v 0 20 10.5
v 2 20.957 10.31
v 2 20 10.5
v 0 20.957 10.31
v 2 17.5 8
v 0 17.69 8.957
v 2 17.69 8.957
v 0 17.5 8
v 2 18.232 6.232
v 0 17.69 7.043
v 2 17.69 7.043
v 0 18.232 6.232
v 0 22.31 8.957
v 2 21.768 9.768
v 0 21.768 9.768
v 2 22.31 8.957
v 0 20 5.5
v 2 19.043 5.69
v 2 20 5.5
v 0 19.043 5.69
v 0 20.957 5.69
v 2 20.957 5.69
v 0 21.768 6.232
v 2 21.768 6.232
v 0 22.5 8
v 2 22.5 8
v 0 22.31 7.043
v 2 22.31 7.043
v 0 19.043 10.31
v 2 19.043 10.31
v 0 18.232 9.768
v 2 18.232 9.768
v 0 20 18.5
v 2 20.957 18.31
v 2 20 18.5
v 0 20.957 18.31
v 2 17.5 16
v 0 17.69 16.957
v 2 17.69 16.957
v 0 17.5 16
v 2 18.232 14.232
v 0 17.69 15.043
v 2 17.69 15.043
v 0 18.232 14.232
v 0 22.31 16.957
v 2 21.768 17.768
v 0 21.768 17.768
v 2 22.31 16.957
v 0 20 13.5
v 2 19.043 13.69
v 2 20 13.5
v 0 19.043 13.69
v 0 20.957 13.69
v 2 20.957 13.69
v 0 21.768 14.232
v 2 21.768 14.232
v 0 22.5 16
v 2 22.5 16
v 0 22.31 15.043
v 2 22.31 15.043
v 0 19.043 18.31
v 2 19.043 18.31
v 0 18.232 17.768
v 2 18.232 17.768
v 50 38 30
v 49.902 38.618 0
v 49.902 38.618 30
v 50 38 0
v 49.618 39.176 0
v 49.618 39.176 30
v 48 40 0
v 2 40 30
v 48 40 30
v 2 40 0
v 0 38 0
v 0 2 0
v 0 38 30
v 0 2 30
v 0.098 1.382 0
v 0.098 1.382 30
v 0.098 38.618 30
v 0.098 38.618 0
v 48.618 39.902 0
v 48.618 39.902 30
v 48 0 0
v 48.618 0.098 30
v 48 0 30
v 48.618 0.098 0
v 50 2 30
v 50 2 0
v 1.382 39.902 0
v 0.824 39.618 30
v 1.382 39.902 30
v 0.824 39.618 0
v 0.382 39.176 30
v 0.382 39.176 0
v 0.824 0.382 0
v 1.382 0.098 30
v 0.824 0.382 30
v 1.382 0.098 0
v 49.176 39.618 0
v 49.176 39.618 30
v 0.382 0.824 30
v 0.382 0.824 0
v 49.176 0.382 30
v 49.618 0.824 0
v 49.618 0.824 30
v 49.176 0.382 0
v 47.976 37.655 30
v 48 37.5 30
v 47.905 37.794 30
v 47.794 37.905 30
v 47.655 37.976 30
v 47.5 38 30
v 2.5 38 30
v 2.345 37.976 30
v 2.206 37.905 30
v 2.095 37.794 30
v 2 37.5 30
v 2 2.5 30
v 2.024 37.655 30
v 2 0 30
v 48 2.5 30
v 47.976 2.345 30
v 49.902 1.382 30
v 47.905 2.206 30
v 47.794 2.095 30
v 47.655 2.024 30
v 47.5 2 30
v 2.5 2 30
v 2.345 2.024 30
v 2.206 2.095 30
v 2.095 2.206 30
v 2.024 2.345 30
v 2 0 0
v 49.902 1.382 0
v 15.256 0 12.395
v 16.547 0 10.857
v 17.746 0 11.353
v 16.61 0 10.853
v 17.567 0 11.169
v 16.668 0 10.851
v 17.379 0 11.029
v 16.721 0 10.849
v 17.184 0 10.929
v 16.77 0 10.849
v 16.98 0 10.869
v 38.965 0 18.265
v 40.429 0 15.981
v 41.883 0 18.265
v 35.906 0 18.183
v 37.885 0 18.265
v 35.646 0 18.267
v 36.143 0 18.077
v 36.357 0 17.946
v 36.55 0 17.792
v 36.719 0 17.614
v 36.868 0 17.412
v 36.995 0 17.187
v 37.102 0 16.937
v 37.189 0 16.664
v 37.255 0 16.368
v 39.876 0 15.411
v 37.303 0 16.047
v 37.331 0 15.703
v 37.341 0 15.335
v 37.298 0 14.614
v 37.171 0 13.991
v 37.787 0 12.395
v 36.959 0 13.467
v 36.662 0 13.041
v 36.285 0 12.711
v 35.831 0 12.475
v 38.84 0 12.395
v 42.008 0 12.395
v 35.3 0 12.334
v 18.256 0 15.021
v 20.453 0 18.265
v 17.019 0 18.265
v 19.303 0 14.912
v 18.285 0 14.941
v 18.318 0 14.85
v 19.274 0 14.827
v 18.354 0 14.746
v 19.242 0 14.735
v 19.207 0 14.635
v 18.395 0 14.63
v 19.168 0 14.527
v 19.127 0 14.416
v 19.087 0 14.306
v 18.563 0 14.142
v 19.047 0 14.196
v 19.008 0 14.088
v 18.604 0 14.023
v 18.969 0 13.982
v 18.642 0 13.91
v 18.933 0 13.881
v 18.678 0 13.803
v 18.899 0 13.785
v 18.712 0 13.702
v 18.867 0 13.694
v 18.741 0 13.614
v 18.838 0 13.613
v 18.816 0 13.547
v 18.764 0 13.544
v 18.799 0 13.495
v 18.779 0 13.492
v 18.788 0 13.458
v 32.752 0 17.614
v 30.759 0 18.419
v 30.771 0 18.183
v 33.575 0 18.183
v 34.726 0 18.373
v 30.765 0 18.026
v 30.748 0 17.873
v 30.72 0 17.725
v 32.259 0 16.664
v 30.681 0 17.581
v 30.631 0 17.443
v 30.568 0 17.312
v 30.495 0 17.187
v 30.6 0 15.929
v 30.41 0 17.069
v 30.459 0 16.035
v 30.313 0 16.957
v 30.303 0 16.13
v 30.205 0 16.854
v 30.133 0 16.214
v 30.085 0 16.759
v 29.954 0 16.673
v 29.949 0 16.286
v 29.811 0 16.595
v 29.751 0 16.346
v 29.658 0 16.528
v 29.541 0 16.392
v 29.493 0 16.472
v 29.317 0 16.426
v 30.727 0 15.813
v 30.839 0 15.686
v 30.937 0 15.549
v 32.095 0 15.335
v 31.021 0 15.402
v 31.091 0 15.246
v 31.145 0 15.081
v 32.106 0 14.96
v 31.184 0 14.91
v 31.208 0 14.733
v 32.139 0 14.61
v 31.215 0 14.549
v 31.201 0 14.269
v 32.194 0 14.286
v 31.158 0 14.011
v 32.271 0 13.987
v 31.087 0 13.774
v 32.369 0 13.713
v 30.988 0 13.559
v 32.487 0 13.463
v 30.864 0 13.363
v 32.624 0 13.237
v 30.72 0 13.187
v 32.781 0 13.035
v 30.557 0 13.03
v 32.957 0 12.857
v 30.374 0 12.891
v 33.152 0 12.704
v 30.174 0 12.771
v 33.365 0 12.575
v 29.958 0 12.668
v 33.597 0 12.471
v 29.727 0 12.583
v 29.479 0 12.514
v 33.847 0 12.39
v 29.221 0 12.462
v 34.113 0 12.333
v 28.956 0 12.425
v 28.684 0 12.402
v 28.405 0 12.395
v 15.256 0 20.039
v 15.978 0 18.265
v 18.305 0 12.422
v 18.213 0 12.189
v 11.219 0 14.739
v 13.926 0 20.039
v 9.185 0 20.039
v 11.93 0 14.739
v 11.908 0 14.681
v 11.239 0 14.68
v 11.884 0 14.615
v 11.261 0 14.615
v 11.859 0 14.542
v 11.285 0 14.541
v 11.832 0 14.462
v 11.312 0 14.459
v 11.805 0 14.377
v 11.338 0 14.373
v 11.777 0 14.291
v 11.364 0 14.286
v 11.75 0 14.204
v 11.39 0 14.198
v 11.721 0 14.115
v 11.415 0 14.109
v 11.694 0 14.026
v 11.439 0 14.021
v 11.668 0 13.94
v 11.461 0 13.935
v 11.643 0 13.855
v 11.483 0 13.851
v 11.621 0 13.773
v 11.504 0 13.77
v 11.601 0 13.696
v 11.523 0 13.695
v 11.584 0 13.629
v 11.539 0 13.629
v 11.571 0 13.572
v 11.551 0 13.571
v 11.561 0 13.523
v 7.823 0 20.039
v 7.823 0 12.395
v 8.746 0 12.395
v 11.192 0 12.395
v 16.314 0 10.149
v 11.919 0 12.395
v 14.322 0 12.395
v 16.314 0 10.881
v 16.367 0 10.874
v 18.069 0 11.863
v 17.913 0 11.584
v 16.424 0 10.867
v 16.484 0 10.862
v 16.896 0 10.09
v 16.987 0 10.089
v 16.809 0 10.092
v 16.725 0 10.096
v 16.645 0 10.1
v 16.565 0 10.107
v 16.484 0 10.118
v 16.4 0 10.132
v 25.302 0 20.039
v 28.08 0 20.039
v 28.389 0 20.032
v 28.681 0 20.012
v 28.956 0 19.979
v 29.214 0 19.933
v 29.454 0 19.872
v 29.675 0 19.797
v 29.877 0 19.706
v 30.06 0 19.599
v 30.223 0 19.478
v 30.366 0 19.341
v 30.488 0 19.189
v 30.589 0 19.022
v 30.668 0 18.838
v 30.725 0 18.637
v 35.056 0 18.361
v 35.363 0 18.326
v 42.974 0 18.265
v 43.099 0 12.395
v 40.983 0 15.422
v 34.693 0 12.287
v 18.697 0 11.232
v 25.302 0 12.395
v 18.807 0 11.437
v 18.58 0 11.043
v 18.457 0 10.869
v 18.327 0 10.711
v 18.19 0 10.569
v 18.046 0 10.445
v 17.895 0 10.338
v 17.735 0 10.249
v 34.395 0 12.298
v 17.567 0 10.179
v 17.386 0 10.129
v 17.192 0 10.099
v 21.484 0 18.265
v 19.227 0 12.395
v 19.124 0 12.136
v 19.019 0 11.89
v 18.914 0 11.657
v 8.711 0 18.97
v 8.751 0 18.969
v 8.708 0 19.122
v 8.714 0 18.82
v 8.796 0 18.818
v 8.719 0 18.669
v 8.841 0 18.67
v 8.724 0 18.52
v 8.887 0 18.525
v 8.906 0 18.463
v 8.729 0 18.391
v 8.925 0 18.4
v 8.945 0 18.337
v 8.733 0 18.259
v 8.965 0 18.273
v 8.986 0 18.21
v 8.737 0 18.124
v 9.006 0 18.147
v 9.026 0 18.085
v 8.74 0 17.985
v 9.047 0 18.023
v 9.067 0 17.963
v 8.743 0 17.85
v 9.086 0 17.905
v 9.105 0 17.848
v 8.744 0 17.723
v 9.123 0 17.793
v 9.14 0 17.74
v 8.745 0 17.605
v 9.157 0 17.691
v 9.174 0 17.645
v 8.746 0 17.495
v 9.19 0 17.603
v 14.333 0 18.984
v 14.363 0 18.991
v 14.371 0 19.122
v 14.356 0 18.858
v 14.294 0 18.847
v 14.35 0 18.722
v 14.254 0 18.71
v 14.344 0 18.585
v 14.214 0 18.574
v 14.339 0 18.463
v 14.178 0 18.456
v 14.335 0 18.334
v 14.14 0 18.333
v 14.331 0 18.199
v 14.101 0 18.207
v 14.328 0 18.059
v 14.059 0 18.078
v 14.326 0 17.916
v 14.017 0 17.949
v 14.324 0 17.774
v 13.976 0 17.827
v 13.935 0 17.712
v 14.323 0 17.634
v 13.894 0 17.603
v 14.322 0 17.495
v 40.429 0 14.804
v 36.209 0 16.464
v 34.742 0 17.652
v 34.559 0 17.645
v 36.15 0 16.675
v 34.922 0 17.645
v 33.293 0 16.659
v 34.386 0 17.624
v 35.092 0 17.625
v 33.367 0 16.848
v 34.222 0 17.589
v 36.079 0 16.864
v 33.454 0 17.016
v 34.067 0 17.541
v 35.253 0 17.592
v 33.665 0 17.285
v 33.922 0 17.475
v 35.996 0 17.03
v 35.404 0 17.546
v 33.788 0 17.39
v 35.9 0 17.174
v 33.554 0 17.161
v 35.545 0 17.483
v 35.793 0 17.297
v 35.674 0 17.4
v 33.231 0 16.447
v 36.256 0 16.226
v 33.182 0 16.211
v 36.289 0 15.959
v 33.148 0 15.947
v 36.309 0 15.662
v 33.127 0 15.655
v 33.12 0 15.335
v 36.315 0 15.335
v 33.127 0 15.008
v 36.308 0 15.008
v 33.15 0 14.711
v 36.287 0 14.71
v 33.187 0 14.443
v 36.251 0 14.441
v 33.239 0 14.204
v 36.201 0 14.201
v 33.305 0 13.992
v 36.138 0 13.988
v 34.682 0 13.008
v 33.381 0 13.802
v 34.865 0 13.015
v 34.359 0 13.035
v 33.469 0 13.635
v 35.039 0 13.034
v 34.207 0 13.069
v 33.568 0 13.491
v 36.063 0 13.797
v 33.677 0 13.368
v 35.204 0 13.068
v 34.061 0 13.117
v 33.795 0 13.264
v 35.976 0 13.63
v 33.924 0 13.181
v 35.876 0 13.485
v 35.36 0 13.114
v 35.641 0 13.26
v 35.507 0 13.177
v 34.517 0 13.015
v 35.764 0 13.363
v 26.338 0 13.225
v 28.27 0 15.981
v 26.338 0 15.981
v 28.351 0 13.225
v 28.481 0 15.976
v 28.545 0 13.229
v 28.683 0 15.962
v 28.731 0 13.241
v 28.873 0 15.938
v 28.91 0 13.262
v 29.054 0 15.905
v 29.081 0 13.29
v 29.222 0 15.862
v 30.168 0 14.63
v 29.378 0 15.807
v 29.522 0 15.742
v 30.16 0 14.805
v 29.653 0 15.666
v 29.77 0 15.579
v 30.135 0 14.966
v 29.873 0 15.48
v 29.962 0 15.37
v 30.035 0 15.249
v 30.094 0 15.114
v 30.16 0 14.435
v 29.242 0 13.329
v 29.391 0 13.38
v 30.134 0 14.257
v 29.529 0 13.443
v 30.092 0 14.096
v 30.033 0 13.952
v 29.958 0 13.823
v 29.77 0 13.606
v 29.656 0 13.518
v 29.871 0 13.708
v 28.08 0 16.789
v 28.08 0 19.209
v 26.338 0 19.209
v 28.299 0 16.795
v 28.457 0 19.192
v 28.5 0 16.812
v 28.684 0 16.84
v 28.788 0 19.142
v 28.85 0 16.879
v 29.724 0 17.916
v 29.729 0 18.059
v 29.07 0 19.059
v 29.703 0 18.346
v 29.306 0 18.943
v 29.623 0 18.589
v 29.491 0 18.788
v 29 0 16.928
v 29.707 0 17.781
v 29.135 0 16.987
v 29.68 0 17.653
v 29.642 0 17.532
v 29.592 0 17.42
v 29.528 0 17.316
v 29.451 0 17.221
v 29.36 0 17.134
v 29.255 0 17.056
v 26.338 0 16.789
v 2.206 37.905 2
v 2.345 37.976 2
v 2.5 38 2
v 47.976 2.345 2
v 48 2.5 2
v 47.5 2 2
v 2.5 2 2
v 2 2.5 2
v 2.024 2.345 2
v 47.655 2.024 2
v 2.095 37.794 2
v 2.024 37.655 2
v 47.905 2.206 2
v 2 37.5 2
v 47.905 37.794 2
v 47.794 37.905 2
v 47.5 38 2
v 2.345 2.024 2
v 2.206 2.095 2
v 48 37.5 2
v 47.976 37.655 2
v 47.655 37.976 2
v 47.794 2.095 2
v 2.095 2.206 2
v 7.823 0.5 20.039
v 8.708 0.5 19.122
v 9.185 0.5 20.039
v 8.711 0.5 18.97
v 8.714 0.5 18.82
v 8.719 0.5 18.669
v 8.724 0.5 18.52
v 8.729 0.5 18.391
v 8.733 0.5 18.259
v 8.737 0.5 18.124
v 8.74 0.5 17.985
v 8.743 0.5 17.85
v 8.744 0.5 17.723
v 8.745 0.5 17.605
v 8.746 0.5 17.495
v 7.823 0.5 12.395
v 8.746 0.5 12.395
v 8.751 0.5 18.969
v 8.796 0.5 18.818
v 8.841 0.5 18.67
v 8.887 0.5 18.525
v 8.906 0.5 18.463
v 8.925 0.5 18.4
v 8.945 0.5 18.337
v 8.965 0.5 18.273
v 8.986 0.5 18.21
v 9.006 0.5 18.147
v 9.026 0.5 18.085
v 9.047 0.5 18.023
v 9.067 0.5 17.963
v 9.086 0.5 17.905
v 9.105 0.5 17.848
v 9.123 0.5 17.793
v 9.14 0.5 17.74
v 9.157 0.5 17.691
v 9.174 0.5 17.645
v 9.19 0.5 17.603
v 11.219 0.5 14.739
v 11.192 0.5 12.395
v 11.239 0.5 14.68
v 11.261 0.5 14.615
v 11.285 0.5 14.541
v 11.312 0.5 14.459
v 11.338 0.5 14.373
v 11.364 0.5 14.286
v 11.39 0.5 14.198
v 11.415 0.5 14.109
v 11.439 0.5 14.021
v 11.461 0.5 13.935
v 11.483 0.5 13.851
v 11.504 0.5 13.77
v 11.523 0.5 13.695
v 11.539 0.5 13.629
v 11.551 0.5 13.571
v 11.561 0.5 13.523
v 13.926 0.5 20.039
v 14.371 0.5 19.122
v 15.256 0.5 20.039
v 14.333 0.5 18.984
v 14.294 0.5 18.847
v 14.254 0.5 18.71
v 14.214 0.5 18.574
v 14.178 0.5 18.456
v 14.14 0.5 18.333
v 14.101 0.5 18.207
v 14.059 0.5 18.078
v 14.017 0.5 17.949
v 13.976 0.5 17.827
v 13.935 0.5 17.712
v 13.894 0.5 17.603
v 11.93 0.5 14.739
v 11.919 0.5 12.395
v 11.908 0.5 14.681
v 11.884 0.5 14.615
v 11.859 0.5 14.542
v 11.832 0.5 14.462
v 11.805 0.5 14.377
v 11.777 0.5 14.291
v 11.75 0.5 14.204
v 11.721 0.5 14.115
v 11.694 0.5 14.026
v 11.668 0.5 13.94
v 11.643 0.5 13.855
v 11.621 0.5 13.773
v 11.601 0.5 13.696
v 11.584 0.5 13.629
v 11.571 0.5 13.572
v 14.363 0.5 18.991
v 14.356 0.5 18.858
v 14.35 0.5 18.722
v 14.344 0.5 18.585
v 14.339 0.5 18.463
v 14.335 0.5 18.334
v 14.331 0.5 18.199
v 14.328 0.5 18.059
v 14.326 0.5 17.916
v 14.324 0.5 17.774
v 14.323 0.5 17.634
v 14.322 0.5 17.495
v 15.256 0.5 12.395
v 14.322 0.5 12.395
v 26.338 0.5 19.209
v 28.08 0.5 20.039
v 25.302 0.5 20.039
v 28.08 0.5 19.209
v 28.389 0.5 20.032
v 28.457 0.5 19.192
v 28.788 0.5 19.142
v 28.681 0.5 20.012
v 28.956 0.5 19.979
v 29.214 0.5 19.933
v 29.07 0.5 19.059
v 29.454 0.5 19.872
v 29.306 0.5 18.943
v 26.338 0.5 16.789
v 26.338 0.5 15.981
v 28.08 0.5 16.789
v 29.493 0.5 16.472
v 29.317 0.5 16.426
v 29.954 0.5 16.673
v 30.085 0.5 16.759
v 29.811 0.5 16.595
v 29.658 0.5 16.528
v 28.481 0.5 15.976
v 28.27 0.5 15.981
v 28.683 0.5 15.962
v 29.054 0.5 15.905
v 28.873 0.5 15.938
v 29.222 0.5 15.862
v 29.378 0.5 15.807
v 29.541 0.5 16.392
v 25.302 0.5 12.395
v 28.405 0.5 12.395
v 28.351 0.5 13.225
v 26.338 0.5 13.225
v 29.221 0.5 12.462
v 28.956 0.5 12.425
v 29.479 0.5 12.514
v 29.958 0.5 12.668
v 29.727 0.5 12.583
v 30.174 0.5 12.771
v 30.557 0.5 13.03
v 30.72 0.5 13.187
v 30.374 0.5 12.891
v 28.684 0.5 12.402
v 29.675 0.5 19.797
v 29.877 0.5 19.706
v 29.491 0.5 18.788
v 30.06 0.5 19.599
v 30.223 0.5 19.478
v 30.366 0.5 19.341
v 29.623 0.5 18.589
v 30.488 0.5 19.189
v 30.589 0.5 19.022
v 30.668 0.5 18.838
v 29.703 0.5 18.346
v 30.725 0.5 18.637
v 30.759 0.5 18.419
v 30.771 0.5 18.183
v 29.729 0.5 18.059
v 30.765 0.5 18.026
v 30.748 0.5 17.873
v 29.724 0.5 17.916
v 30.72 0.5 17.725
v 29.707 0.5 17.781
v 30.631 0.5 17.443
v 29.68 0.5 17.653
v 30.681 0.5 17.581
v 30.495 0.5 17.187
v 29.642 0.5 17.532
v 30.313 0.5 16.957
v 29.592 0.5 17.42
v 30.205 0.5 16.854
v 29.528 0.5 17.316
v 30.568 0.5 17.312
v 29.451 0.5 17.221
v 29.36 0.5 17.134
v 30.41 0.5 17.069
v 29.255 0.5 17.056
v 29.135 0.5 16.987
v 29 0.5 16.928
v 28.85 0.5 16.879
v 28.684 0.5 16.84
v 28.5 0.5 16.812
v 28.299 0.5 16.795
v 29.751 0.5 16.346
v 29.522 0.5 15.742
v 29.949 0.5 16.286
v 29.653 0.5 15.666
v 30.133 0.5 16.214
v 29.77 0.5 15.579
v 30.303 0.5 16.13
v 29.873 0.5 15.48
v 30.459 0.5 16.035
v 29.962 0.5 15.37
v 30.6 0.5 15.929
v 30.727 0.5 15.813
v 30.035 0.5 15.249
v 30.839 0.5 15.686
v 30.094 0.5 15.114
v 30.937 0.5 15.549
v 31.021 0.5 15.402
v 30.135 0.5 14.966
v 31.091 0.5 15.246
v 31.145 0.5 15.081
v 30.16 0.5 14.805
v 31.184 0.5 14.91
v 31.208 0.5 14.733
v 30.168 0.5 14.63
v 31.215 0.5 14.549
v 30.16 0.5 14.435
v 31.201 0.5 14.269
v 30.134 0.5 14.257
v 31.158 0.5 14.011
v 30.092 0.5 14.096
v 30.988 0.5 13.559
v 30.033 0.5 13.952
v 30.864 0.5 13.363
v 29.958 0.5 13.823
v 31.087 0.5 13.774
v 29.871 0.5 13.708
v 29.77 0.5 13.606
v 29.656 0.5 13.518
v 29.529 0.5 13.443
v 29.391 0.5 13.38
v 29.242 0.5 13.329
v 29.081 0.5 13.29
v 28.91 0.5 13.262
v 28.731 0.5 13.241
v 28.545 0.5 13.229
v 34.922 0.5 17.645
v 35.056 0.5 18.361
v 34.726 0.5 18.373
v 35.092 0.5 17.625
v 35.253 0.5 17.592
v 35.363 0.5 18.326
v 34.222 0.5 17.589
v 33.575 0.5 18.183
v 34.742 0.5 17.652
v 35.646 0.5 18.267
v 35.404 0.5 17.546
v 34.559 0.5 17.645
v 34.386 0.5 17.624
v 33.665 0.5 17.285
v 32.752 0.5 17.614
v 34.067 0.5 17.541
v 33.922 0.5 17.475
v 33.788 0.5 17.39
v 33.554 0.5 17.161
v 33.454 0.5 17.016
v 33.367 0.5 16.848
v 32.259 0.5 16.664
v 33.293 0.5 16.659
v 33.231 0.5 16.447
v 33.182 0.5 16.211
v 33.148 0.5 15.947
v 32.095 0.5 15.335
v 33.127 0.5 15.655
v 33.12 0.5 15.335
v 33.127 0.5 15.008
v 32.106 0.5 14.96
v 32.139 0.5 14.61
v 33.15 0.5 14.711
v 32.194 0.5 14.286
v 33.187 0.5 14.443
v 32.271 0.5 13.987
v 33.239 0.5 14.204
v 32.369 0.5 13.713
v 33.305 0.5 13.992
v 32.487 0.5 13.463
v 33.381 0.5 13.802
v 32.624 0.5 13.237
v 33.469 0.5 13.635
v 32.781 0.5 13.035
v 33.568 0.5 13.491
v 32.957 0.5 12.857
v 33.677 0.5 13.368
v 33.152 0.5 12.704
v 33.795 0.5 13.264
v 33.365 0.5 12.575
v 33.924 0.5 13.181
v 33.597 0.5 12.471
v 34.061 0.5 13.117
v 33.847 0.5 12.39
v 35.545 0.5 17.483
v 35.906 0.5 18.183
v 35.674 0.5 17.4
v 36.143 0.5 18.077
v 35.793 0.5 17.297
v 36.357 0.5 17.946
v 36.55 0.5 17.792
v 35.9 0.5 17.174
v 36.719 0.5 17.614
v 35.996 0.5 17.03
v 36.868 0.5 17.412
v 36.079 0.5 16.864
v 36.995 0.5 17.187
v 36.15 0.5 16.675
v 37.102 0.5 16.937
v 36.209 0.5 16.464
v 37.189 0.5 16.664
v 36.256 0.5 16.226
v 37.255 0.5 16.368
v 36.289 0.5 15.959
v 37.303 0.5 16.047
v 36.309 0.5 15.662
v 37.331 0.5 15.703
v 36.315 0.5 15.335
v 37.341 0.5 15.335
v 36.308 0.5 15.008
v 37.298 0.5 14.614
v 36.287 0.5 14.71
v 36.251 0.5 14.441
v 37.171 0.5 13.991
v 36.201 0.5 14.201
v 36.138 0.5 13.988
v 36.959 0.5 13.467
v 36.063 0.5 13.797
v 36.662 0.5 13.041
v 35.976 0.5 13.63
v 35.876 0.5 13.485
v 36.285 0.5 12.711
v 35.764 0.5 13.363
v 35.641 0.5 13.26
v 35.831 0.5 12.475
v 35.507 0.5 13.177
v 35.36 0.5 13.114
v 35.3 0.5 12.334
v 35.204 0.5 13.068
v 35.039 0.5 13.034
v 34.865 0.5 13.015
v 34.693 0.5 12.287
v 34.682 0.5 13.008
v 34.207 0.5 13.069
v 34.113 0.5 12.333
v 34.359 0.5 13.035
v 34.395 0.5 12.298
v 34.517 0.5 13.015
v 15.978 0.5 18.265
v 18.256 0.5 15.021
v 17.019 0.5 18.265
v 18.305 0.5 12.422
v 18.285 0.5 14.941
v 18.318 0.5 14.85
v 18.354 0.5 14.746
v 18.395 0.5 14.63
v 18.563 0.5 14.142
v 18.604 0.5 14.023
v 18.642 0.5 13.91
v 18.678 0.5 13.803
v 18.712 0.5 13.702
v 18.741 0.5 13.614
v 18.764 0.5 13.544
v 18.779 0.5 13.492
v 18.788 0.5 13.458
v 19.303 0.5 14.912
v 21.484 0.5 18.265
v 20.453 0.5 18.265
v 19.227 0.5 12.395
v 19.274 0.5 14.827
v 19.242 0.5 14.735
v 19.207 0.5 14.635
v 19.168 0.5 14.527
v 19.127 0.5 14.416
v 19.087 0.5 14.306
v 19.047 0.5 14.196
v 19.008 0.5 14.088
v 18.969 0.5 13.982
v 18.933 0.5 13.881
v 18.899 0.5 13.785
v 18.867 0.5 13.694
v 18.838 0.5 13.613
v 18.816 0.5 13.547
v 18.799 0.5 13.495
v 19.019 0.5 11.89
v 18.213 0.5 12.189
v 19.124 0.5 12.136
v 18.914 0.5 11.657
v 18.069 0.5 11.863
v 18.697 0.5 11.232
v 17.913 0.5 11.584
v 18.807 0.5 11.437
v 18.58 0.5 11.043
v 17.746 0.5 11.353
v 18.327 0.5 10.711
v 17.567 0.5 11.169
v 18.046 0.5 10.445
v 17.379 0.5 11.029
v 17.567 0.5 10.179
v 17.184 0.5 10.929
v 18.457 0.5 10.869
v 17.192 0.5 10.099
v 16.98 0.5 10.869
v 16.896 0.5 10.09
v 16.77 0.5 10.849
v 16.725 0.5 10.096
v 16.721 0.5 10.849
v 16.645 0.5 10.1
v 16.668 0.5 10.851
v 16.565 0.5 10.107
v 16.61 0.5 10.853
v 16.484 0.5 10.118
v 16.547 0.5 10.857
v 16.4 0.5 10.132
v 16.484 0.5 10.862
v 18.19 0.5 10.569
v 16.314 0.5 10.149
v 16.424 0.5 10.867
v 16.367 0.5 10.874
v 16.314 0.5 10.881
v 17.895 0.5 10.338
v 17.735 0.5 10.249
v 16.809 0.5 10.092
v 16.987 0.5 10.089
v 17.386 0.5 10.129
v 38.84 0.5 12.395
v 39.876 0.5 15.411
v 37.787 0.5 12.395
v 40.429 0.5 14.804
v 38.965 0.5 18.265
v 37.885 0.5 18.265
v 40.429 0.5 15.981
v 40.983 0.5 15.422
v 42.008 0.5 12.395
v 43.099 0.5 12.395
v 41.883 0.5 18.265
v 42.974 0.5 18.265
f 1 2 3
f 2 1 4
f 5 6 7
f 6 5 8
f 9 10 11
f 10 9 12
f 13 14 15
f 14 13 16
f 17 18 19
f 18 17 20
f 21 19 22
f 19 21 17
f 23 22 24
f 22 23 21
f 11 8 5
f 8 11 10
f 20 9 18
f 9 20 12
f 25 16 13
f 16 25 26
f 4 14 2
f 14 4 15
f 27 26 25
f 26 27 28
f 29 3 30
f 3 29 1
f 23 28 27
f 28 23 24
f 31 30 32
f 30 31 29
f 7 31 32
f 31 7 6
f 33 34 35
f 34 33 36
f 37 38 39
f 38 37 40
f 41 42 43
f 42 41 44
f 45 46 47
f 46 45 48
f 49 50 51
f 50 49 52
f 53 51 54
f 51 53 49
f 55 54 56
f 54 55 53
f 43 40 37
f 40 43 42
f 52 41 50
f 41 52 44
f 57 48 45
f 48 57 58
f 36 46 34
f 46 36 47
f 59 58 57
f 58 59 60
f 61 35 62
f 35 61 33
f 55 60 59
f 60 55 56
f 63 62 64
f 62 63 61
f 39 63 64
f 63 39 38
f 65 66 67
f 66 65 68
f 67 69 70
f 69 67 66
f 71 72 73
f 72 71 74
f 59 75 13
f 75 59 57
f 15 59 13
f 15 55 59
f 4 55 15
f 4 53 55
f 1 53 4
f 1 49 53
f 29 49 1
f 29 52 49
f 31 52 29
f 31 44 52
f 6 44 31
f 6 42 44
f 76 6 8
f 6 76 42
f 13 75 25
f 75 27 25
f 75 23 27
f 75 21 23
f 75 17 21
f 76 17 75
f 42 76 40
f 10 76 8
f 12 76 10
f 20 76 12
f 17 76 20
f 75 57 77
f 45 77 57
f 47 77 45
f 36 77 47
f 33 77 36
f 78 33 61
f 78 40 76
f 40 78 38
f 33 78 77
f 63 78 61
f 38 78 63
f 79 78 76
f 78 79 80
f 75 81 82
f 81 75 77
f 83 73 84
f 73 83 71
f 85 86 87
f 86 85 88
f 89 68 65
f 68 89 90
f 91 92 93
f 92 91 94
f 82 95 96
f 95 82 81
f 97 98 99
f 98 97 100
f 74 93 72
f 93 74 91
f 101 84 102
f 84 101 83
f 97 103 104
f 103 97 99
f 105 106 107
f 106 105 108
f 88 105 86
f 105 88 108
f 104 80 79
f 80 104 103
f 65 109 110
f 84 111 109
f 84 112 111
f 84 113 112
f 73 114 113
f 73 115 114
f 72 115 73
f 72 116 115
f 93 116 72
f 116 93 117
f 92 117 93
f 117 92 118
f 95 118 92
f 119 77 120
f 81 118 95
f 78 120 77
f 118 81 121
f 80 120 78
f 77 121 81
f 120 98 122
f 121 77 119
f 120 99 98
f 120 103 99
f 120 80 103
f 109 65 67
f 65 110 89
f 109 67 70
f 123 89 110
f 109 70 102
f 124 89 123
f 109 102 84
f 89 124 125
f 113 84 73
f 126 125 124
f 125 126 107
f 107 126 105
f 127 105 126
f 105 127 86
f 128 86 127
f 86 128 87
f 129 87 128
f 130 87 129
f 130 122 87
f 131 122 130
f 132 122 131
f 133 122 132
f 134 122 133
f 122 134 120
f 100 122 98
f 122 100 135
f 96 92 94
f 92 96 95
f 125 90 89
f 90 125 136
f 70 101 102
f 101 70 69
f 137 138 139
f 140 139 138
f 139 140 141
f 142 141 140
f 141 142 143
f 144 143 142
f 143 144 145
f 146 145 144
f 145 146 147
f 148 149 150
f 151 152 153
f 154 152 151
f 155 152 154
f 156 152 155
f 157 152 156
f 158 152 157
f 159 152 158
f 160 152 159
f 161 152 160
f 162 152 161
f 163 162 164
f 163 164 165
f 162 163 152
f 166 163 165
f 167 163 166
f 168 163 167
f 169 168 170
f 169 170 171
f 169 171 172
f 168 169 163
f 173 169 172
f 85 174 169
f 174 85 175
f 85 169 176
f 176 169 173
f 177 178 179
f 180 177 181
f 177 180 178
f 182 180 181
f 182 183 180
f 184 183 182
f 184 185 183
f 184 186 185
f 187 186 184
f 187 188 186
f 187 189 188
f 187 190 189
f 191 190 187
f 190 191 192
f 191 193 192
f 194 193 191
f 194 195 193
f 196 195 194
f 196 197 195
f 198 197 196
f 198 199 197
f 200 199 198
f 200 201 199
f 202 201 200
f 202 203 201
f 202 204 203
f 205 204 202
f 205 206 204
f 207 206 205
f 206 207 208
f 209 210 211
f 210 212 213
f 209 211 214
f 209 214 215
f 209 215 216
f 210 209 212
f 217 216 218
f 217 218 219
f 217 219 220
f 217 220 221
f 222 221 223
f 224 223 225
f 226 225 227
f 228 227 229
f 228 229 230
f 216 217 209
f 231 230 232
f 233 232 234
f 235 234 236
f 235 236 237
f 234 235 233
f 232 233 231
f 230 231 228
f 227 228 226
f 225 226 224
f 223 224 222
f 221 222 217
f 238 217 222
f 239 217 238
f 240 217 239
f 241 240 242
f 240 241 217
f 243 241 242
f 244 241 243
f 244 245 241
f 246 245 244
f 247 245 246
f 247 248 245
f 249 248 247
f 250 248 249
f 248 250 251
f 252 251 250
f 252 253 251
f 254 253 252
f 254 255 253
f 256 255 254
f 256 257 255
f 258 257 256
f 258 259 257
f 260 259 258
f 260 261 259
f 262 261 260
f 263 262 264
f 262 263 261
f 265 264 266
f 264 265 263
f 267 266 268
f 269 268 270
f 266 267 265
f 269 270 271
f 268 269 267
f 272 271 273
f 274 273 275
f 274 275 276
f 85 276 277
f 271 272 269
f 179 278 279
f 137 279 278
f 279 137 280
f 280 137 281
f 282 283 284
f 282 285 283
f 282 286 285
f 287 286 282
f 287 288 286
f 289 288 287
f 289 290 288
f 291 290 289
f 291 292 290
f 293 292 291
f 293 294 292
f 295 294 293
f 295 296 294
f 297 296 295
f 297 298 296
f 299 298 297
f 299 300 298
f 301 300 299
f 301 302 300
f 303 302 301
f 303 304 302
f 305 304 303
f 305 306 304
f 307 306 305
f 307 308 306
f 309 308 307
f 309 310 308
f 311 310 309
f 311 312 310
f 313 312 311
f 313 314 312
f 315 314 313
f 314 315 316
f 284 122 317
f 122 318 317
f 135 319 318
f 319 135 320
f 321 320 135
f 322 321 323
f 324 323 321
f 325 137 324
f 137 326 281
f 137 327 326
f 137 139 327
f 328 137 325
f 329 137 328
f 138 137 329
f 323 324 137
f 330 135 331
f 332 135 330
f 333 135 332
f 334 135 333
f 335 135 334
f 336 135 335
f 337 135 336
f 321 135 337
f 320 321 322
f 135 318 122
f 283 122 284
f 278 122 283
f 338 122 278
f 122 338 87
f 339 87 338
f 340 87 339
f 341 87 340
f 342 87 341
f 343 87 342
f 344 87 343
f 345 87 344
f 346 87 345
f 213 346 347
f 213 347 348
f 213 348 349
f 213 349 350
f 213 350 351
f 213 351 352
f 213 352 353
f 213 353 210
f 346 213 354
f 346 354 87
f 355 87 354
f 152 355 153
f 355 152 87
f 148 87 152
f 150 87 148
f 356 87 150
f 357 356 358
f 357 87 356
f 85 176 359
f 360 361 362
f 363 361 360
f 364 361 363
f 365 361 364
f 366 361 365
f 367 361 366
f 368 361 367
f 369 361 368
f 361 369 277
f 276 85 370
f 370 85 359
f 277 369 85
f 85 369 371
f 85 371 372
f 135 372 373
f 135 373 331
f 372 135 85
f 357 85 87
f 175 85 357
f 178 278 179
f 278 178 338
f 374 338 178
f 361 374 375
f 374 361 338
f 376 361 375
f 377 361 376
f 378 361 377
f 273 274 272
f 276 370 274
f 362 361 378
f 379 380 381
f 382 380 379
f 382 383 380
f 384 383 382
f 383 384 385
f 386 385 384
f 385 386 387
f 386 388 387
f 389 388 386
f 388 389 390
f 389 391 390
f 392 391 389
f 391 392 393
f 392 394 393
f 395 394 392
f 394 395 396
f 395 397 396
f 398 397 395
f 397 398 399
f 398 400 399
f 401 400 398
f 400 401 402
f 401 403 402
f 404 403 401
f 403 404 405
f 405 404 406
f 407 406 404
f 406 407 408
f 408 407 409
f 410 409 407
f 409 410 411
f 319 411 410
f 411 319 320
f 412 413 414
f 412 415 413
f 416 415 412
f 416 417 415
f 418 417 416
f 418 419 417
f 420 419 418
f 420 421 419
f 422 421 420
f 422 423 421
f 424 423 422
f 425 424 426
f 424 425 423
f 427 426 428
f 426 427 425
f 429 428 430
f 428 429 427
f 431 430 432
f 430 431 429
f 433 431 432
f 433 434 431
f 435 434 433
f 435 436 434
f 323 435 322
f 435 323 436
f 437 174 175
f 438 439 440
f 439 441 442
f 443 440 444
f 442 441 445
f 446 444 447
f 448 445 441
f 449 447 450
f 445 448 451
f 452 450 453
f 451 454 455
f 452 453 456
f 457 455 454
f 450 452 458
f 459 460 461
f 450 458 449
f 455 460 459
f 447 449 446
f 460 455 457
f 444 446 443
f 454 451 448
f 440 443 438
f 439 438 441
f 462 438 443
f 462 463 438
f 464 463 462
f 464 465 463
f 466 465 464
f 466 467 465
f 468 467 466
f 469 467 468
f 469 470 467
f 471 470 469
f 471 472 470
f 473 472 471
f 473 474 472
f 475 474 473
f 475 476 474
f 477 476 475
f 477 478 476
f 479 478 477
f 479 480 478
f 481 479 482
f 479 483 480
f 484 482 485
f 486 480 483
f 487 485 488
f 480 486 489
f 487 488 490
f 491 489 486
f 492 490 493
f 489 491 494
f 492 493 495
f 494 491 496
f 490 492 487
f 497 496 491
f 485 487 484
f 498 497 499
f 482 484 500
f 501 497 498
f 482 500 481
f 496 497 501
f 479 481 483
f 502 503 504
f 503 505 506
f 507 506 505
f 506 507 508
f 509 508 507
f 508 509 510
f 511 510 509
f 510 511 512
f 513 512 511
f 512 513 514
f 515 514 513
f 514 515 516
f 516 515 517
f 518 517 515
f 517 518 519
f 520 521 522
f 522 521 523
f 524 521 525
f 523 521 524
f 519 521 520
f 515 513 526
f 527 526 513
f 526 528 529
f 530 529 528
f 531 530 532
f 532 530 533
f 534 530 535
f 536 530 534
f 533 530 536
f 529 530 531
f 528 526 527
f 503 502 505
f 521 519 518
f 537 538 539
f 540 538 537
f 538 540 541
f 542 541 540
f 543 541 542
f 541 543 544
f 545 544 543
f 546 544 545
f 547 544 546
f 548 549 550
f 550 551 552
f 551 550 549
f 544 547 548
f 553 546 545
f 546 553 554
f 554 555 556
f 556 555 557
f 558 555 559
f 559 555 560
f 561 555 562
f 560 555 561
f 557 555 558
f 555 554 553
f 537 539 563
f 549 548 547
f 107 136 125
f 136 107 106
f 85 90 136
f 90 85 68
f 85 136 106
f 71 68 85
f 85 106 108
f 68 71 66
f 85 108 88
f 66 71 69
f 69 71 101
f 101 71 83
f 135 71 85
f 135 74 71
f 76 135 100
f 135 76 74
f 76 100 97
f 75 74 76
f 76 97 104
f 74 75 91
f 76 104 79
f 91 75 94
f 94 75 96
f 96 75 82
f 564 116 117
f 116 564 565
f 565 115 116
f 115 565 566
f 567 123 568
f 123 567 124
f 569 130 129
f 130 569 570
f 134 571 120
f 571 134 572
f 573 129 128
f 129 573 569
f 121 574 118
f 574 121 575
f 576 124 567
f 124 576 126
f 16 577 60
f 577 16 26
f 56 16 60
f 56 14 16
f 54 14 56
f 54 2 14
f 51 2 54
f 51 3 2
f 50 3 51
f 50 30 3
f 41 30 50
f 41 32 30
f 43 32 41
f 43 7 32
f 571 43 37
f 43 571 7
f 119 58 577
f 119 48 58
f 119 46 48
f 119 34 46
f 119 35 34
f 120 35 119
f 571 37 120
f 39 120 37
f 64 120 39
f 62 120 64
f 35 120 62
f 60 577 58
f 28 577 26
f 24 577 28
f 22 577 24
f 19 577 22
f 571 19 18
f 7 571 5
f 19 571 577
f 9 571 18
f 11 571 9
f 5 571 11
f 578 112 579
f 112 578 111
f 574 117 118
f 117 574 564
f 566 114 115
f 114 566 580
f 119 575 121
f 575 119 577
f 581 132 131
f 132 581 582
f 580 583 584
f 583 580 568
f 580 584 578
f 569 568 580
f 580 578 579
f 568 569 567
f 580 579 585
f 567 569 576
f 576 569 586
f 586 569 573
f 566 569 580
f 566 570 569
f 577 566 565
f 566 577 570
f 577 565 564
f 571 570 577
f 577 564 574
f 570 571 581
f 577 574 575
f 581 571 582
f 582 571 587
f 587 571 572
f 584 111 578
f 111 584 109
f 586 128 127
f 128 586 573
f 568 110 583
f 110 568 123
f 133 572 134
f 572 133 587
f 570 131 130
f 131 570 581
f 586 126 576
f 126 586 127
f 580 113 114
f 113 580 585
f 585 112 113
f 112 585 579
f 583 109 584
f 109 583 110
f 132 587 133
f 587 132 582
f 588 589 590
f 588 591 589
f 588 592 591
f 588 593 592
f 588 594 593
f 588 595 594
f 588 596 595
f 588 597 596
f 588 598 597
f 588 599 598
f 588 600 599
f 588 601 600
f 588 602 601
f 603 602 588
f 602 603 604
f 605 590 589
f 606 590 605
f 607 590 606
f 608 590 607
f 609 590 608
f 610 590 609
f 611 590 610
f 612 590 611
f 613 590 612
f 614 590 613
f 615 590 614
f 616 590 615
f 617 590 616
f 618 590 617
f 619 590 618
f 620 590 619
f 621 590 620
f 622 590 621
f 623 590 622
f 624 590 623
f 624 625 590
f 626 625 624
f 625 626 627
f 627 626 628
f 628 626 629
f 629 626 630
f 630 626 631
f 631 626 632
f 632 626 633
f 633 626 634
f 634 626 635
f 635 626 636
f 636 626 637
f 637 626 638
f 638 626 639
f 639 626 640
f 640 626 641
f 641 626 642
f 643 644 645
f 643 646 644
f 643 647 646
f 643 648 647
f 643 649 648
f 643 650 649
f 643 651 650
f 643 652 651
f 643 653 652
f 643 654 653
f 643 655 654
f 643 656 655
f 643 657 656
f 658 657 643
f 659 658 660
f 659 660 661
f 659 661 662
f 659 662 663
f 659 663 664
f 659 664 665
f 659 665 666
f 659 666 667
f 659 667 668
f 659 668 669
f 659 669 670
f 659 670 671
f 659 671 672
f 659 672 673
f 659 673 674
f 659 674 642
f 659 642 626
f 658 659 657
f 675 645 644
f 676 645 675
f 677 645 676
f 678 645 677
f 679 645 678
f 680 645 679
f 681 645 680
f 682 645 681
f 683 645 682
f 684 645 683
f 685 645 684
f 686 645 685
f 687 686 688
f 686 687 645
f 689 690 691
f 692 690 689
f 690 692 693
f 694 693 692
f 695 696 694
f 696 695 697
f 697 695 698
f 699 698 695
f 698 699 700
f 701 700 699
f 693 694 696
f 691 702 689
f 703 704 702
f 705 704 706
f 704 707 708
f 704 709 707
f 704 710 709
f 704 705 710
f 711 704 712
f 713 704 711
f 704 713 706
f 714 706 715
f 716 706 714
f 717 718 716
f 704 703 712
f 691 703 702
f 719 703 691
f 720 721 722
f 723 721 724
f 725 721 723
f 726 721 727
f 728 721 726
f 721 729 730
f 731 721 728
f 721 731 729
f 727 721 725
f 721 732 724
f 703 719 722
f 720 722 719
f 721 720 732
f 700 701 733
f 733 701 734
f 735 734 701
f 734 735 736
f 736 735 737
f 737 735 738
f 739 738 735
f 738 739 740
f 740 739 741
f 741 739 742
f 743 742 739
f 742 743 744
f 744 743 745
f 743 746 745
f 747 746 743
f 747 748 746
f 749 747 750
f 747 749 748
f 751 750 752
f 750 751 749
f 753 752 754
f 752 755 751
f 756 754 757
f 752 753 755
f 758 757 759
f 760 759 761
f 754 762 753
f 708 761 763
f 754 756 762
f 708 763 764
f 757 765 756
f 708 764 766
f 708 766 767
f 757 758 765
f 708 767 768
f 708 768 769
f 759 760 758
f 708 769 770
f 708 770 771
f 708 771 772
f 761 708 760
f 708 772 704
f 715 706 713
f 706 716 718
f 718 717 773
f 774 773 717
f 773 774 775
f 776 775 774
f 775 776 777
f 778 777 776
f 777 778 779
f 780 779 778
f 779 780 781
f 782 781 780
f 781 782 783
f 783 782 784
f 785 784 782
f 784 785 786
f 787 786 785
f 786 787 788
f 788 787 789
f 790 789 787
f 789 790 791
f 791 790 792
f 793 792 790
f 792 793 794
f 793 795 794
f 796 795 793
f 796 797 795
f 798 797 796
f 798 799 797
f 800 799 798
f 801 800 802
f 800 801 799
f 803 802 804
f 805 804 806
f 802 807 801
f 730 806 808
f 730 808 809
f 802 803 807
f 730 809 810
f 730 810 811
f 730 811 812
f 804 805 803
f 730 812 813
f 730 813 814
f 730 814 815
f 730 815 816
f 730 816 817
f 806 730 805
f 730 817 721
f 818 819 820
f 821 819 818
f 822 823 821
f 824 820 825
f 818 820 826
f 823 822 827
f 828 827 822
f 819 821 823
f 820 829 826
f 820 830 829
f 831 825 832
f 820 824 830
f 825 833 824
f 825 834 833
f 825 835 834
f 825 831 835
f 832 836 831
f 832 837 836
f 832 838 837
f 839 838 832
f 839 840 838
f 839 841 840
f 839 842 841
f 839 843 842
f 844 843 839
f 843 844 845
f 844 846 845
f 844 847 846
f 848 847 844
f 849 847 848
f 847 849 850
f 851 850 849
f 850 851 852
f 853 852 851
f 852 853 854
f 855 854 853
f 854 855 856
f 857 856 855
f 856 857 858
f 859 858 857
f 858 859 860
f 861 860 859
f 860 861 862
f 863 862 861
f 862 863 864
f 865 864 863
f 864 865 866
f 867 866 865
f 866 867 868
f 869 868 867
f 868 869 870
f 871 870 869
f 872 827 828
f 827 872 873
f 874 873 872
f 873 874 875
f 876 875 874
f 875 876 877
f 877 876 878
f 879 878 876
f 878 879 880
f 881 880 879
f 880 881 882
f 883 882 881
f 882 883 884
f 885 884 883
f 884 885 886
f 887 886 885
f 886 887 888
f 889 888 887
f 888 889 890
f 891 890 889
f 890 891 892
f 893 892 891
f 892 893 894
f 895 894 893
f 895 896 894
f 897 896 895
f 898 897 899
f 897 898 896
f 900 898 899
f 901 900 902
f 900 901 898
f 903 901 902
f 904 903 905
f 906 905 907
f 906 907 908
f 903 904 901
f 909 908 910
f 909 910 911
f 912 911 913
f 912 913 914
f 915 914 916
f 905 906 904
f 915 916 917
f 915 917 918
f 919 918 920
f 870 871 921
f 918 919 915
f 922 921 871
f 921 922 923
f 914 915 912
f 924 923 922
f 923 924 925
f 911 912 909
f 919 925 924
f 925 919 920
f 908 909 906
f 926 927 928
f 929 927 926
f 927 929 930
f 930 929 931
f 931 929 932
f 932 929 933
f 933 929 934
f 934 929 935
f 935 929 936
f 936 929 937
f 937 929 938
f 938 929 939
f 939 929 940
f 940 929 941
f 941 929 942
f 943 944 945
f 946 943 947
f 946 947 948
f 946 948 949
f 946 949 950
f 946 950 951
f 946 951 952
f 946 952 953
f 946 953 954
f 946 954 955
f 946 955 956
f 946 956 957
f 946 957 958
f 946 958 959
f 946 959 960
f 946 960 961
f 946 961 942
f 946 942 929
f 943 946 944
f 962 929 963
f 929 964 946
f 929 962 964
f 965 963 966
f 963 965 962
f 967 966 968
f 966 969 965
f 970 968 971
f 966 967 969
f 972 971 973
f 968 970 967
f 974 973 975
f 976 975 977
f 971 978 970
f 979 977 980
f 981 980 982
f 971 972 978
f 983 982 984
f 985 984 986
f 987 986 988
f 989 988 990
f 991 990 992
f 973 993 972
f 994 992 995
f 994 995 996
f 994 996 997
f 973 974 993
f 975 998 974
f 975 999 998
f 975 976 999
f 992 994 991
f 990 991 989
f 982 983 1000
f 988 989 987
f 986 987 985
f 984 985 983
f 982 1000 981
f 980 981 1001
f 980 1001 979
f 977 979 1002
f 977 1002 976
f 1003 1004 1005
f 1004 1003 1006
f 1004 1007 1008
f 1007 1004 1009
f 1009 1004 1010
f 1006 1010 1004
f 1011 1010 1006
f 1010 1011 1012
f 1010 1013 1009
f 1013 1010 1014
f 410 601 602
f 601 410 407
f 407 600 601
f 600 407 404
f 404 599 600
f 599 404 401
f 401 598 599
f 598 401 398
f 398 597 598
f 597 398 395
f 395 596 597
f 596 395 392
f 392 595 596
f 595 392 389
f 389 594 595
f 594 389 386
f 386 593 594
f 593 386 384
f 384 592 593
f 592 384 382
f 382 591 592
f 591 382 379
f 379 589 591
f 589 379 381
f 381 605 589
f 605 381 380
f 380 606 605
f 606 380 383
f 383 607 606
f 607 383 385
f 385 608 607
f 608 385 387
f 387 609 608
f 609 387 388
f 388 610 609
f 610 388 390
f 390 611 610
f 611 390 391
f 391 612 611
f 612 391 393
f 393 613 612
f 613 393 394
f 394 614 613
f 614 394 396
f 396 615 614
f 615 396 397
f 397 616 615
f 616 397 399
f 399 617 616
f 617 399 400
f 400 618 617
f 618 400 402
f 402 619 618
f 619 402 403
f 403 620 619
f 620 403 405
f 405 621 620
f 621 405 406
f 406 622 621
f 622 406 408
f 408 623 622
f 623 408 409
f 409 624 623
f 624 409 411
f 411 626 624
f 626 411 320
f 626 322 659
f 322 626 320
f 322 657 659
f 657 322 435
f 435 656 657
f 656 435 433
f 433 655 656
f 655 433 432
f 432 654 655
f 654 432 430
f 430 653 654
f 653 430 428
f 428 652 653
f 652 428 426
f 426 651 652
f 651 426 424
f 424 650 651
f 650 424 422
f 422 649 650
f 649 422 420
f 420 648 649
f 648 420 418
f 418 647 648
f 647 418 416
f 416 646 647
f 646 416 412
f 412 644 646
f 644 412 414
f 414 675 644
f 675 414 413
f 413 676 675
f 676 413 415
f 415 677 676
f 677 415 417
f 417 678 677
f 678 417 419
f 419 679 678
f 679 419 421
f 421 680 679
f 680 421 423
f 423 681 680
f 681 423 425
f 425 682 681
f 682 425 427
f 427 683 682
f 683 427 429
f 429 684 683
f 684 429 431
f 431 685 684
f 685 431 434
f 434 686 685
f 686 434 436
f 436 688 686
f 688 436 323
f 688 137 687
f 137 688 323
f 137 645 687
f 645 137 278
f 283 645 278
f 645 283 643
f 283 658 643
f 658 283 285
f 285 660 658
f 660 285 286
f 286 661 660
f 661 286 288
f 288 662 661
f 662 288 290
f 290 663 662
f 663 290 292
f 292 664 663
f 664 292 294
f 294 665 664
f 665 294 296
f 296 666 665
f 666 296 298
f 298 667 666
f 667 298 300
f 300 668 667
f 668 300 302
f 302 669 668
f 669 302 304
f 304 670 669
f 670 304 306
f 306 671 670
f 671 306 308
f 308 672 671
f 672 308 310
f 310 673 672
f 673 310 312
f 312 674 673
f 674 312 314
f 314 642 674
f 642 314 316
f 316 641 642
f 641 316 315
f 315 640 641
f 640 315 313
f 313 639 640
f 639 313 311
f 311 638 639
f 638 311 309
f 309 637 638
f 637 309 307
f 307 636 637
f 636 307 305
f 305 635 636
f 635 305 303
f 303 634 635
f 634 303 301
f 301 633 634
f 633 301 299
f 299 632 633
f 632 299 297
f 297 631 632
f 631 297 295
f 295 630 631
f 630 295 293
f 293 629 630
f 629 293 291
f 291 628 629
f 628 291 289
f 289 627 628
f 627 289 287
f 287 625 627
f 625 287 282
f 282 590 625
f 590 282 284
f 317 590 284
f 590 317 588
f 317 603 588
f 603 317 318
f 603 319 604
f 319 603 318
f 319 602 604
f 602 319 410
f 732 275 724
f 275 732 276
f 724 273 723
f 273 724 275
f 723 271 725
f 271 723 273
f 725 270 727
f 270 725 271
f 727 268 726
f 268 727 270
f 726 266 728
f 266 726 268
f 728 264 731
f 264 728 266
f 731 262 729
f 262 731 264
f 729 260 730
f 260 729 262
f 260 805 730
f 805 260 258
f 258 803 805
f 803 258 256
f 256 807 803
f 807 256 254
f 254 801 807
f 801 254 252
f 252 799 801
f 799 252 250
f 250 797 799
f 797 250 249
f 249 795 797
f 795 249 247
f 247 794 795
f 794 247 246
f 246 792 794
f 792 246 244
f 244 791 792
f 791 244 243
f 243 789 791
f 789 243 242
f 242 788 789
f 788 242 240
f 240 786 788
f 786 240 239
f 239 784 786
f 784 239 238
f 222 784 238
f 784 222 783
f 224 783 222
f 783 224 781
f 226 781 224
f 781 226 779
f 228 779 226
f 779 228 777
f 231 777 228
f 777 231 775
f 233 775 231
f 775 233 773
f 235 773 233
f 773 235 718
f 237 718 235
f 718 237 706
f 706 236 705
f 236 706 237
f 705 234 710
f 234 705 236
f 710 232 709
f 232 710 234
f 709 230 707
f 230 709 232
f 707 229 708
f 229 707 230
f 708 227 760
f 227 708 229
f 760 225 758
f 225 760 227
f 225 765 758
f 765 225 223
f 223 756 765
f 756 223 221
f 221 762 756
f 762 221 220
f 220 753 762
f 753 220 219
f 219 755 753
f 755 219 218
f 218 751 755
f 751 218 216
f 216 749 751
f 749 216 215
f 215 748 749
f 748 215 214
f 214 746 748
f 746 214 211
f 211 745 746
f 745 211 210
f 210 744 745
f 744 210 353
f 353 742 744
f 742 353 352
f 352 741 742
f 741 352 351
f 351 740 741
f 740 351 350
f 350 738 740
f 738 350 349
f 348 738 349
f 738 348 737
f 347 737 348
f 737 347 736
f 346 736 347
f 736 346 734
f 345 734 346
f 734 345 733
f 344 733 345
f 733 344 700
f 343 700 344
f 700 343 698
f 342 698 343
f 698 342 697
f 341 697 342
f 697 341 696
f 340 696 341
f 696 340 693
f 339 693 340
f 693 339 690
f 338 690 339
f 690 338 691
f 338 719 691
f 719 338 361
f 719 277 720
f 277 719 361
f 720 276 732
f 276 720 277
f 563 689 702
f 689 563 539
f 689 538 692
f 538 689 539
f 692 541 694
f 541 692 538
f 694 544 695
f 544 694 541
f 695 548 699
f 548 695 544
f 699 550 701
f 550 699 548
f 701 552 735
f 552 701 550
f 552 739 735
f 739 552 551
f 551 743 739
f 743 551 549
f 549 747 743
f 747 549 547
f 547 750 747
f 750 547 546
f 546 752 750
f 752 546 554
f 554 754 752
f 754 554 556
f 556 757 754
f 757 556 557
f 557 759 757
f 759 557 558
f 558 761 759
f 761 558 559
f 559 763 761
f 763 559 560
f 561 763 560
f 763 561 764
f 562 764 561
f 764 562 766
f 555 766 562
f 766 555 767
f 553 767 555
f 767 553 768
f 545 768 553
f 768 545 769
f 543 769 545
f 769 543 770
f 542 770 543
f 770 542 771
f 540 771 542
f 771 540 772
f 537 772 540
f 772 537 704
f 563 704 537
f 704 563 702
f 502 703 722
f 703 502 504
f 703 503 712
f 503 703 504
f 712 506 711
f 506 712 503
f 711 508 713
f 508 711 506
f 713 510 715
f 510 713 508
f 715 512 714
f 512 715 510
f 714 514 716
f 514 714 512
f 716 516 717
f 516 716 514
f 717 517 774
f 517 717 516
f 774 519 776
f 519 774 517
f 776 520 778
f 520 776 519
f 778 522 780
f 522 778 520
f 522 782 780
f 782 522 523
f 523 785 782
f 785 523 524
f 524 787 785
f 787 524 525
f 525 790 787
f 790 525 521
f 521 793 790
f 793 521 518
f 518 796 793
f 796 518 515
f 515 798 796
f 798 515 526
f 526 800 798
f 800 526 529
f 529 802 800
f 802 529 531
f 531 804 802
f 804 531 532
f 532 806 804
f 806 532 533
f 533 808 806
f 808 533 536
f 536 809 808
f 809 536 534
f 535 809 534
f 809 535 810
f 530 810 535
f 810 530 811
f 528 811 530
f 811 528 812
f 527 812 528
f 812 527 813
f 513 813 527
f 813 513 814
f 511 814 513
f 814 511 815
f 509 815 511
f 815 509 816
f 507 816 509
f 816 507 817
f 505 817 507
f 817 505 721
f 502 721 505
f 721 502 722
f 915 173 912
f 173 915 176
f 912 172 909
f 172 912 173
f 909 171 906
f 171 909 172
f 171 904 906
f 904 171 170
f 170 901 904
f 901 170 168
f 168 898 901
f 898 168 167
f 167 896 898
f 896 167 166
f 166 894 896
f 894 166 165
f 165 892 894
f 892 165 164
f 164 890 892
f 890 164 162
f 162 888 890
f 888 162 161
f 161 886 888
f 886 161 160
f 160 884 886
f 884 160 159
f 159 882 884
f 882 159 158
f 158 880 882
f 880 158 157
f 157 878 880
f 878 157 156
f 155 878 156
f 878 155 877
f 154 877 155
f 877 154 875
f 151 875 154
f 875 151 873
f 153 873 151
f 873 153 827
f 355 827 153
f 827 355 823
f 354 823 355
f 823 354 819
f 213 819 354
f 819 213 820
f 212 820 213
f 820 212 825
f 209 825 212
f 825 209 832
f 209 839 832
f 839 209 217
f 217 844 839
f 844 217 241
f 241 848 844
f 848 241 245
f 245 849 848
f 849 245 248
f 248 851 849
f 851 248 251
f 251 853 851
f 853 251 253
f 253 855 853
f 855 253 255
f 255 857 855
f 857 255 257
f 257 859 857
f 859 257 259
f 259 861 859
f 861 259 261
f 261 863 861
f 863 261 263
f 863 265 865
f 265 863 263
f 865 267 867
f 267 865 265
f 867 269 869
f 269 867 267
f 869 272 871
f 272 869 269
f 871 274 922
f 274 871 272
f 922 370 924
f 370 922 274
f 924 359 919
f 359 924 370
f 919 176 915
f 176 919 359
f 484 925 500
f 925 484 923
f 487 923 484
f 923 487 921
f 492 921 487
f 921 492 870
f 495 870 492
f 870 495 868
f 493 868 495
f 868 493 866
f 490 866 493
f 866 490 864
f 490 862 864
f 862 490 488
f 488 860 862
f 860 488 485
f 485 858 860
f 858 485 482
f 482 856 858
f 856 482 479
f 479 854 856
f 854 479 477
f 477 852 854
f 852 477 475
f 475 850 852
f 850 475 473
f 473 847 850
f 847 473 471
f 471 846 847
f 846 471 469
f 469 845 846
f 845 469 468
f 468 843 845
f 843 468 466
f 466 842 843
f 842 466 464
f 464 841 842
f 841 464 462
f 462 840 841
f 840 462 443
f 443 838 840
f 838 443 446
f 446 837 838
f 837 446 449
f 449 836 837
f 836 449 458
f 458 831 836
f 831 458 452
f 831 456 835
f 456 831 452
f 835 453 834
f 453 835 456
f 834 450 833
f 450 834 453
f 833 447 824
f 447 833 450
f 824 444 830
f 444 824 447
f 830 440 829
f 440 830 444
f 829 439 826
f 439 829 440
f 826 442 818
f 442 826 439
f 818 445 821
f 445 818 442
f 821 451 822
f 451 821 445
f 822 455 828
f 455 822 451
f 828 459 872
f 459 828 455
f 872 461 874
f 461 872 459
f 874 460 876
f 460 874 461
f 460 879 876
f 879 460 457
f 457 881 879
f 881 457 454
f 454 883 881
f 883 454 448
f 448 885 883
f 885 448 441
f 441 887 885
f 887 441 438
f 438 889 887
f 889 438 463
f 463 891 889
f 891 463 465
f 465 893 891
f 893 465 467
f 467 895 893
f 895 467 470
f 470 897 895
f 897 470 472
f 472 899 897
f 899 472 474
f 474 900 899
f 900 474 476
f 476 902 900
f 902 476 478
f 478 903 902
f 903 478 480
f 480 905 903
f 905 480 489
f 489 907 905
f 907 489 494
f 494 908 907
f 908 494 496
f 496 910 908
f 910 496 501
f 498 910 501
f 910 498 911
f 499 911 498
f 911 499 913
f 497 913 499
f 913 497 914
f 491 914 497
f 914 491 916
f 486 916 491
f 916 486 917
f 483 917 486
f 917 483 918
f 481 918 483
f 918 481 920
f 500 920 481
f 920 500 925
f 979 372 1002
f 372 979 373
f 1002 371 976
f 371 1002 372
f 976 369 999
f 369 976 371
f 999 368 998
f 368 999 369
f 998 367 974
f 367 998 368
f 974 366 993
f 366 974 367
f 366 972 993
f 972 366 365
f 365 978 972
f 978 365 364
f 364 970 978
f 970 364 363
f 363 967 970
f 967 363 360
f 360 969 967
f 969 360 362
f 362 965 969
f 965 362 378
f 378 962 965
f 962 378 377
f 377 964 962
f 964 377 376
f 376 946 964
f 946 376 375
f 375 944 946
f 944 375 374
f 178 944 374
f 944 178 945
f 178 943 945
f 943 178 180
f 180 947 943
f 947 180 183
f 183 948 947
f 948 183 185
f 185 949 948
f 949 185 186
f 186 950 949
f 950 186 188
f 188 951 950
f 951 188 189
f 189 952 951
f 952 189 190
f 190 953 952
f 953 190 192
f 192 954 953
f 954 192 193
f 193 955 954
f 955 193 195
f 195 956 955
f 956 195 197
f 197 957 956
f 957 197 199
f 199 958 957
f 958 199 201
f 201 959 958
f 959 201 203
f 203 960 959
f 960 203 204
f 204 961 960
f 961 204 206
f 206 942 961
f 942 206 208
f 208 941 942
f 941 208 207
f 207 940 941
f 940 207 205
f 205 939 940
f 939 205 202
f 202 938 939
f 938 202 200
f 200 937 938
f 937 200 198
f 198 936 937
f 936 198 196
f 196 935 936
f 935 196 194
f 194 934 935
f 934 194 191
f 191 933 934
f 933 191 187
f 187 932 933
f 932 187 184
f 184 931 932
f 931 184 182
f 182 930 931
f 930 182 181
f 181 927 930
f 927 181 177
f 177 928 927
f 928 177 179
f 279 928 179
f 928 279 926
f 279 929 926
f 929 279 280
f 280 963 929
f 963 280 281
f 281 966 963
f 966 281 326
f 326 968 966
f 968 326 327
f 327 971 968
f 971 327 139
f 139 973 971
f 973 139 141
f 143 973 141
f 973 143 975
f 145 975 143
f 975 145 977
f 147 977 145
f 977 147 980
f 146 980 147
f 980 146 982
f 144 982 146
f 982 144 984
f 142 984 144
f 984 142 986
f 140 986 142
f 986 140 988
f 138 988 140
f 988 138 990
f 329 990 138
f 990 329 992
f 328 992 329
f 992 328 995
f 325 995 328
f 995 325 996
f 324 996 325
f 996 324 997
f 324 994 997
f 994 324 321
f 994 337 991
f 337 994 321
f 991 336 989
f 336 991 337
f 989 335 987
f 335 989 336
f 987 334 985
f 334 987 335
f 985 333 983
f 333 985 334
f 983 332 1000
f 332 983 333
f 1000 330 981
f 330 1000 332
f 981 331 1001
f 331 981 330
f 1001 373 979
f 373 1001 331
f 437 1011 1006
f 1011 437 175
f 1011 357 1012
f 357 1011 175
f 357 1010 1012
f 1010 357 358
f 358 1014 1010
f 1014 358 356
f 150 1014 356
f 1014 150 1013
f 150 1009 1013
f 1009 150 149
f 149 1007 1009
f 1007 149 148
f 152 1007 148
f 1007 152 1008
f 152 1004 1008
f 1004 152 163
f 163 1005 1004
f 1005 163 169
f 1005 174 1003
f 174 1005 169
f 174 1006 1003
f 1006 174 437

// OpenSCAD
// BEGIN_VIEWPOINTS
// 25,35,0,0,0,0,200       // Front perspective
// 0,0,0,0,0,0,300         // Top down
// 90,0,45,0,0,0,180       // Angled side
// END_VIEWPOINTS

// BEGIN_PARAMS
// The overall width of the box in mm.
// Must be at least 10mm for structural integrity.
width = 50;


// The overall depth of the box in mm.
depth = 40;


// The overall height of the box in mm.
height = 30;


// Wall thickness in mm.
// Minimum recommended: 1.2mm for FDM printing.
wall = 2;


// Text to emboss on the lid.
label = "My Box";


// Whether to add ventilation holes.
vents = true;


// Shape of ventilation holes.
// Affects airflow characteristics.
vent_shape = "circle"; // [circle, square, hexagon]


// Outer dimensions as [x, y, z] for reference.
outer_dims = [50, 40, 30];
// END_PARAMS

// BEGIN_PARAM_SETS
// set: Thin Walls
// wall = 1.2
// label = "Thin"

// set: Thick & Solid
// wall = 4
// vents = false
// label = "Solid"

// set: Large Hex Vents
// width = 100
// depth = 80
// height = 60
// vent_shape = "hexagon"
// label = "Large Hex"
// END_PARAM_SETS

// ==========================================
// Main geometry below
// ==========================================

module rounded_box(w, d, h, r=2) {
    hull() {
        for (x = [r, w-r], y = [r, d-r]) {
            translate([x, y, 0])
                cylinder(h=h, r=r, $fn=20);
        }
    }
}

difference() {
    // Outer shell
    rounded_box(width, depth, height);

    // Inner cavity
    translate([wall, wall, wall])
        rounded_box(width - 2*wall, depth - 2*wall, height, max(0.5, 2 - wall));

    // Label emboss on front face
    if (label != "") {
        translate([width/2, 0.5, height/2])
            rotate([90, 0, 0])
                linear_extrude(1)
                    text(label, size=8, halign="center", valign="center");
    }

    // Ventilation holes on one side
    if (vents) {
        hole_count = floor((height - 10) / 8);
        for (i = [0:hole_count-1]) {
            translate([-0.5, depth/2, 8 + i*8]) {
                rotate([0, 90, 0]) {
                    if (vent_shape == "circle") {
                        cylinder(h=wall+1, r=2.5, $fn=16);
                    } else if (vent_shape == "square") {
                        translate([-2.5, -2.5, 0])
                            cube([5, 5, wall+1]);
                    } else if (vent_shape == "hexagon") {
                        cylinder(h=wall+1, r=3, $fn=6);
                    }
                }
            }
        }
    }
}
